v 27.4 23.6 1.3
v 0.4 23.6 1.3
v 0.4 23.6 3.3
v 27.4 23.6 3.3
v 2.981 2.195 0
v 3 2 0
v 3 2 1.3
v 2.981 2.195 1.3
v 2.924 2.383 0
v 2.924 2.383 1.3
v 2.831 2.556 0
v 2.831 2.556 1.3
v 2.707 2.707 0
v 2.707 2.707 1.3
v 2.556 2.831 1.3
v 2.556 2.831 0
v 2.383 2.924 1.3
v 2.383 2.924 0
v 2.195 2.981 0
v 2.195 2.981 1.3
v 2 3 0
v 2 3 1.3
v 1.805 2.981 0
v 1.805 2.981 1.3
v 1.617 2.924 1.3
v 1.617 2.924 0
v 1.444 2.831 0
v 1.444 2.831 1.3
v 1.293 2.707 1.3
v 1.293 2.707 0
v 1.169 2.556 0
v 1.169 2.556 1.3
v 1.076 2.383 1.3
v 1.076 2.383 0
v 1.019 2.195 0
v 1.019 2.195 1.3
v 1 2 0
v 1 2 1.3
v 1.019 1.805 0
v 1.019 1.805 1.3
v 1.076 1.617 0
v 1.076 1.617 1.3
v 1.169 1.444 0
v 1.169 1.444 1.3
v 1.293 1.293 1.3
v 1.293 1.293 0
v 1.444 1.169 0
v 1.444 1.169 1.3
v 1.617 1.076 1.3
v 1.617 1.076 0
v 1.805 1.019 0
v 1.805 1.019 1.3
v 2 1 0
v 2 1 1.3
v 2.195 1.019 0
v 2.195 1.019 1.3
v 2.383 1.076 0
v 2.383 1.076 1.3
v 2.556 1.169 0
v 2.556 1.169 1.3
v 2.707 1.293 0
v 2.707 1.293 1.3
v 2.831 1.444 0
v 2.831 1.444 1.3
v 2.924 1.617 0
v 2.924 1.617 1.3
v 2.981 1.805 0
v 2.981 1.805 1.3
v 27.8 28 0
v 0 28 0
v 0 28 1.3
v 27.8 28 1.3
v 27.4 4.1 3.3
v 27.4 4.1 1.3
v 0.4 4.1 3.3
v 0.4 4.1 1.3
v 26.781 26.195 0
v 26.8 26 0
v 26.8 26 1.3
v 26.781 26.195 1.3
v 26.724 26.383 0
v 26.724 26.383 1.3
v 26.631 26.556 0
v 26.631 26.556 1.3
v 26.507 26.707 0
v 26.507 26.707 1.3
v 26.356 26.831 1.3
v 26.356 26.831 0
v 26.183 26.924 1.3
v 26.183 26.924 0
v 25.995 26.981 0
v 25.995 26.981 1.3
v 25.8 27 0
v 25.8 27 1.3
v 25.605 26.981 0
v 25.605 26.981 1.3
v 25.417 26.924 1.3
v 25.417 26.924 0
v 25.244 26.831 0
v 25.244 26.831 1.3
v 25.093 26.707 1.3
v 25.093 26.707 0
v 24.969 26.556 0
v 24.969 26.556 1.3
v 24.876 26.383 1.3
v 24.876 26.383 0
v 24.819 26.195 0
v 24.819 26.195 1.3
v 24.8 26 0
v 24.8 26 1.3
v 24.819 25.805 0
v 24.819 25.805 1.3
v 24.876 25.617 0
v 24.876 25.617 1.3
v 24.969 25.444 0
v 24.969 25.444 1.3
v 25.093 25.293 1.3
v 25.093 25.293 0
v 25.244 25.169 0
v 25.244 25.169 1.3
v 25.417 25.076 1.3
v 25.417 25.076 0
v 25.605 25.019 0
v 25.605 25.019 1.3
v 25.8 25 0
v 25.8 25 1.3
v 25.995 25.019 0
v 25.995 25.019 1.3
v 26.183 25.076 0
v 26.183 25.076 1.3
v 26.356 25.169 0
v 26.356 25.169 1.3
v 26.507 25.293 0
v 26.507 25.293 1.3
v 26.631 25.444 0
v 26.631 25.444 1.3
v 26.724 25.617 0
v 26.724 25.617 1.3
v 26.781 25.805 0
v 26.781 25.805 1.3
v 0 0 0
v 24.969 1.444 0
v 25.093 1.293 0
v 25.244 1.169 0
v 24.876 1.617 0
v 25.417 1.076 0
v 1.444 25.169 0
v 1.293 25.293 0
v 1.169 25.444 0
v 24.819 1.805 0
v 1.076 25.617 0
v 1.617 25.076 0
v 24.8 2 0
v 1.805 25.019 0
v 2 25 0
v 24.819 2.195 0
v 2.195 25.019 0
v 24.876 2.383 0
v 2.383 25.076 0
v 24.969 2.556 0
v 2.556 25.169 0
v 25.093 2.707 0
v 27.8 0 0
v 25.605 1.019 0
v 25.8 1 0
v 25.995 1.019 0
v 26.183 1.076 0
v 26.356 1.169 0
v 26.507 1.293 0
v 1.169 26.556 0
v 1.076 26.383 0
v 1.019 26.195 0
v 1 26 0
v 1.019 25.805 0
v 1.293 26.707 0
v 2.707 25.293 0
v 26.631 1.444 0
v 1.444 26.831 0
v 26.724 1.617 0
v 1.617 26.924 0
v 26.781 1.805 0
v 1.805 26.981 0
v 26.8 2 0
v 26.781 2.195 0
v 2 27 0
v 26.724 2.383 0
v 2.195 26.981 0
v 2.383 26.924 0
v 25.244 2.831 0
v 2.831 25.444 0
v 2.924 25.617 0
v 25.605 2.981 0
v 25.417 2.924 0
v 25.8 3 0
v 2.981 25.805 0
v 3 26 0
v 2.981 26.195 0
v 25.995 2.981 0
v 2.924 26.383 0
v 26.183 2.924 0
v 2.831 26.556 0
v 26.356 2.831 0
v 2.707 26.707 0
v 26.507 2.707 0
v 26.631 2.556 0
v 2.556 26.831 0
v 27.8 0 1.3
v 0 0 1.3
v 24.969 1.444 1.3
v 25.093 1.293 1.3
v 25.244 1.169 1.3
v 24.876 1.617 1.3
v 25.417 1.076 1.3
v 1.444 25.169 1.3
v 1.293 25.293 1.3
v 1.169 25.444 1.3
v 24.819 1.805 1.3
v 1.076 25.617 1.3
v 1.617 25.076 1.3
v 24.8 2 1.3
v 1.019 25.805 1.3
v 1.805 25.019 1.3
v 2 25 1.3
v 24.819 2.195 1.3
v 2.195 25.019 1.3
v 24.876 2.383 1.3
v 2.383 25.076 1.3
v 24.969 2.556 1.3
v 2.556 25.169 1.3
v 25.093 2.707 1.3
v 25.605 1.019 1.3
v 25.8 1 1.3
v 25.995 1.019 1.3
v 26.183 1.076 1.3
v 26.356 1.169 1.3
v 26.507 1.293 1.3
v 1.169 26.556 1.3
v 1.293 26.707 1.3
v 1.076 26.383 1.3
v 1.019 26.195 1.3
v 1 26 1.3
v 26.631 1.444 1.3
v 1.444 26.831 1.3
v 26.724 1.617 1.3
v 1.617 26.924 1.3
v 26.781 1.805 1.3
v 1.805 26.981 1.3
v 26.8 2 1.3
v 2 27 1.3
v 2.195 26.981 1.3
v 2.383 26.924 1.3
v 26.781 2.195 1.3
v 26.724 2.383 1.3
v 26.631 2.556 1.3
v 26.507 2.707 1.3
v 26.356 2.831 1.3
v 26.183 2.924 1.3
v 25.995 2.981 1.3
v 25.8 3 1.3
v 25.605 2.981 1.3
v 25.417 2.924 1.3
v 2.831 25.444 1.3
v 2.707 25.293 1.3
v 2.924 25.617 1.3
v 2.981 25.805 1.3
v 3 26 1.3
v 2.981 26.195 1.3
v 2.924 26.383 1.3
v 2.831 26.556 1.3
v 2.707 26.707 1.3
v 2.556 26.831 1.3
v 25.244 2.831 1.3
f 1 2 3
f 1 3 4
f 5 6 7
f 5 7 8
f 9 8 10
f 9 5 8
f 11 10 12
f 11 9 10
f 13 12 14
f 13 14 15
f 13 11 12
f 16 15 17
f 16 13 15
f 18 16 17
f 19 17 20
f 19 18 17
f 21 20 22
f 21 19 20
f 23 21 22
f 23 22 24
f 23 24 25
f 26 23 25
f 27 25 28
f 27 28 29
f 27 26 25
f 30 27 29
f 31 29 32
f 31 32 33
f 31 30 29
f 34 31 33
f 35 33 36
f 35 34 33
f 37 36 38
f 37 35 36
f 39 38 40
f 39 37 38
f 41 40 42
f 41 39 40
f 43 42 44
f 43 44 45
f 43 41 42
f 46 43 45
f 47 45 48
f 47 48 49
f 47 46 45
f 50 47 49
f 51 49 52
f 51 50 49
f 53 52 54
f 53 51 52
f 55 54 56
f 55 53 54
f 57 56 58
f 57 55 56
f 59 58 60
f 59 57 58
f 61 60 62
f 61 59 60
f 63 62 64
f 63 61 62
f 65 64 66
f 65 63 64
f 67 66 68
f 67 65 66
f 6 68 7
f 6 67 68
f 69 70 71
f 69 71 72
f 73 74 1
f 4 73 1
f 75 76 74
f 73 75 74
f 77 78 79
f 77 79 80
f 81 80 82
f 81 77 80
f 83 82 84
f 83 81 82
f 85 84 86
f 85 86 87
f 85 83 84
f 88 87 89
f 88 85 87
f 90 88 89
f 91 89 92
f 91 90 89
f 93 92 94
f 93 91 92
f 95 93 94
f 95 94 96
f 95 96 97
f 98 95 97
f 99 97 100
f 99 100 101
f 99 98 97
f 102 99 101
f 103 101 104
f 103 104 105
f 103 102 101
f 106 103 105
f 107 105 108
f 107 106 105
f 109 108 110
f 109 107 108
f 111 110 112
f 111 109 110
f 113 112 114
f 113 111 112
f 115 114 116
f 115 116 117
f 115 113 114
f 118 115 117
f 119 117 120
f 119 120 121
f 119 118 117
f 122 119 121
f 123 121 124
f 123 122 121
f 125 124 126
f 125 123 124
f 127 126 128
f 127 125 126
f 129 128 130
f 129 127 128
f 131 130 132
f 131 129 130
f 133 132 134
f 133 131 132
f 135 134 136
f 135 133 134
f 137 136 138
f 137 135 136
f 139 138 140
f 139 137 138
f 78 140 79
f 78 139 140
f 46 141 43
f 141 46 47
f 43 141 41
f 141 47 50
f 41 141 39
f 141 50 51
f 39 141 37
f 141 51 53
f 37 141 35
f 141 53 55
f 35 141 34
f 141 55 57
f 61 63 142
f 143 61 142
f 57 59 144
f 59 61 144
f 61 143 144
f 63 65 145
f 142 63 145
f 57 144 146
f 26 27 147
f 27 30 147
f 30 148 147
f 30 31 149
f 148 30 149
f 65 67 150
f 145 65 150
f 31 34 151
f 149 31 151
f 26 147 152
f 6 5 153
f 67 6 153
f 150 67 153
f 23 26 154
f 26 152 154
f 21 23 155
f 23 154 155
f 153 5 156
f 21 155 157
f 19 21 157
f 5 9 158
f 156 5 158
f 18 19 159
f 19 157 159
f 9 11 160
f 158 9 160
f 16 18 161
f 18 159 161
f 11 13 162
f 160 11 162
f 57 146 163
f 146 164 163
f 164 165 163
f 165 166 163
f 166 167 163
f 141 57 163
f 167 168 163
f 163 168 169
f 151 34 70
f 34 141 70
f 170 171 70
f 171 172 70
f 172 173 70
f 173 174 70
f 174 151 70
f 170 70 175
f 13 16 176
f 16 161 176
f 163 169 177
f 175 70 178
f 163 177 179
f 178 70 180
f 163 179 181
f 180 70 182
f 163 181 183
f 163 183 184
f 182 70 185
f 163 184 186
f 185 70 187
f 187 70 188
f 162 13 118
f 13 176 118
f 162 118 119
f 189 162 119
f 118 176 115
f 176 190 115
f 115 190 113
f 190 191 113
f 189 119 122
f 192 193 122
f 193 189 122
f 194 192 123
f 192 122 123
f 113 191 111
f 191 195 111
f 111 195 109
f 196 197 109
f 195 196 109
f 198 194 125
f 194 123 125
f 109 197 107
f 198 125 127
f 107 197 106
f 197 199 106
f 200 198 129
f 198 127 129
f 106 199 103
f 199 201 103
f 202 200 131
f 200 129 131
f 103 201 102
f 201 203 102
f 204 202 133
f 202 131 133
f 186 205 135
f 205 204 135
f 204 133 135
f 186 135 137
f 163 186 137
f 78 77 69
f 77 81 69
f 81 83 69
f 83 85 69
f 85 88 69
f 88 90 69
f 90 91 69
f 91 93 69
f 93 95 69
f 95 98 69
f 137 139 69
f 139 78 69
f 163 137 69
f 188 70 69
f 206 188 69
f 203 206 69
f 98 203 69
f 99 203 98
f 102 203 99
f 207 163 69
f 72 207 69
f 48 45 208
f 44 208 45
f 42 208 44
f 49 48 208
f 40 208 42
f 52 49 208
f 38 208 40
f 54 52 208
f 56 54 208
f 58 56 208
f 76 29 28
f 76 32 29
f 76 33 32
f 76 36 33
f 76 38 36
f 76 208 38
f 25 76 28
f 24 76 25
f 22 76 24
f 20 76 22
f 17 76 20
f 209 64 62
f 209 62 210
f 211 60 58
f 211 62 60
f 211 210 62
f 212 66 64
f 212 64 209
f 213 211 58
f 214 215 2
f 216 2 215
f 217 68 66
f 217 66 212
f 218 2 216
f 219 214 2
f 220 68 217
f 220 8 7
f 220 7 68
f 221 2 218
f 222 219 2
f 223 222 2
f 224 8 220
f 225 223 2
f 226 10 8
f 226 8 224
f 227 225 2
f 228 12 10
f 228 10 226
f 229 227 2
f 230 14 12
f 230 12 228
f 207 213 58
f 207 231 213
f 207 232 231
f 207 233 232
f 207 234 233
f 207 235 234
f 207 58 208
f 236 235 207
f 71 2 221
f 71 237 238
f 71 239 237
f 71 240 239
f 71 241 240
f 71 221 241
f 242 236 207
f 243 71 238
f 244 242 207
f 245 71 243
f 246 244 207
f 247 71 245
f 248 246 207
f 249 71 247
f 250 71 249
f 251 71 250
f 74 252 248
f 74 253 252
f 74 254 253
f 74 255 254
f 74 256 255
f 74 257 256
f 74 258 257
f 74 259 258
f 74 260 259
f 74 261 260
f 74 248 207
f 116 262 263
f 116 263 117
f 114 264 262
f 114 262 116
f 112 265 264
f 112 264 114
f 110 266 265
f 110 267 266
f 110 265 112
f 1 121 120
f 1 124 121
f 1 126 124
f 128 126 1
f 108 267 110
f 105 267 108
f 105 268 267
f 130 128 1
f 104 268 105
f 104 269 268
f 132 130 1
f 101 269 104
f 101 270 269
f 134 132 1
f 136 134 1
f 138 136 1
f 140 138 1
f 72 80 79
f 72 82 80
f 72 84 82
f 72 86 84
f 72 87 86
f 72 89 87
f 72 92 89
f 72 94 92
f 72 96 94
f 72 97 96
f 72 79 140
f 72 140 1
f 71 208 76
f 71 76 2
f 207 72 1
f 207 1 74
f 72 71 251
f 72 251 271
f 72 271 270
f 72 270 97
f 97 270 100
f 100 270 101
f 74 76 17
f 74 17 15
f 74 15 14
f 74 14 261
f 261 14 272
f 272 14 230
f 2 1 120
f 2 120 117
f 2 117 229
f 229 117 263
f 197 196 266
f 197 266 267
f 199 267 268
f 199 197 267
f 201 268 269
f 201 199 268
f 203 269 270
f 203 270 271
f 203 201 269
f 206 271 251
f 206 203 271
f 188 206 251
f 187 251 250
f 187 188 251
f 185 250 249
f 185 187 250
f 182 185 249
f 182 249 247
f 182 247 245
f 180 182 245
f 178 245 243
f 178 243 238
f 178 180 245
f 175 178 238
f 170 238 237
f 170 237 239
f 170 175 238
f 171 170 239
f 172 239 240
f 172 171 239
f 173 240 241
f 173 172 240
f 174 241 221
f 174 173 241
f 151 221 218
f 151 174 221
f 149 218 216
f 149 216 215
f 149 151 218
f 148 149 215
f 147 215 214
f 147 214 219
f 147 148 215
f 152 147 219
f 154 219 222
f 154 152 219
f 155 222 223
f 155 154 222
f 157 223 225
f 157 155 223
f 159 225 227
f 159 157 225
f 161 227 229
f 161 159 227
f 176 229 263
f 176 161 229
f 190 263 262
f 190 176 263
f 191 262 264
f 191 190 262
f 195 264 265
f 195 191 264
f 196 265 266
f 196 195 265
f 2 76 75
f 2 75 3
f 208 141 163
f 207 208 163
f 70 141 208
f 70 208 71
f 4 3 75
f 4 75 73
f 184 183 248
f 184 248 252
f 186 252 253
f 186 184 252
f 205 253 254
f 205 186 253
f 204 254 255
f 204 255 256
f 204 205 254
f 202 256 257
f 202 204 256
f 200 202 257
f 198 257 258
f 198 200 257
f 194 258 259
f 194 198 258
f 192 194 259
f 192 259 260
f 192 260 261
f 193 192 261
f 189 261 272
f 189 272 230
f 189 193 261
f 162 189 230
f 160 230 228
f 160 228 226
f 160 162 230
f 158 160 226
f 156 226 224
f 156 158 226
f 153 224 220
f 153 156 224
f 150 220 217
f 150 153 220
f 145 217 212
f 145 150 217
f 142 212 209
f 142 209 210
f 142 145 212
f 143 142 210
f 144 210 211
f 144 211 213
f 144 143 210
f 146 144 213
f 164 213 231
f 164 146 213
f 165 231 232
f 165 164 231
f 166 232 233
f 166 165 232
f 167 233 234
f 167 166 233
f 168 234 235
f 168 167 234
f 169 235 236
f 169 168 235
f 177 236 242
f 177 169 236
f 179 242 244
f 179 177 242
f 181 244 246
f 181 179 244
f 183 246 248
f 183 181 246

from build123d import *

# Parameters (mm, degrees)
SKETCH1_W           = 27.8
SKETCH1_H           = 28
SKETCH1_R           = 1
BOSS_EXTRUDE1_DEPTH = 1.3
SKETCH2_W           = 27
SKETCH2_H           = 19.5
BOSS_EXTRUDE2_DEPTH = 2


with BuildPart() as part:
    # Sketch1 → Boss-Extrude1 (new body)
    with BuildSketch(Plane.XY):
        with Locations((13.9, 14)):
            Rectangle(SKETCH1_W, SKETCH1_H)
        with Locations((25.8, 26)):
            Circle(SKETCH1_R, mode=Mode.SUBTRACT)
        with Locations((2, 26)):
            Circle(SKETCH1_R, mode=Mode.SUBTRACT)
        with Locations((25.8, 2)):
            Circle(SKETCH1_R, mode=Mode.SUBTRACT)
        with Locations((2, 2)):
            Circle(SKETCH1_R, mode=Mode.SUBTRACT)
    extrude(amount=BOSS_EXTRUDE1_DEPTH)

    # Sketch2 → Boss-Extrude2 (add)
    with BuildSketch(Plane.XY.offset(1.3)):
        with Locations((13.9, 13.85)):
            Rectangle(SKETCH2_W, SKETCH2_H)
    extrude(amount=BOSS_EXTRUDE2_DEPTH)


solid = part.part
